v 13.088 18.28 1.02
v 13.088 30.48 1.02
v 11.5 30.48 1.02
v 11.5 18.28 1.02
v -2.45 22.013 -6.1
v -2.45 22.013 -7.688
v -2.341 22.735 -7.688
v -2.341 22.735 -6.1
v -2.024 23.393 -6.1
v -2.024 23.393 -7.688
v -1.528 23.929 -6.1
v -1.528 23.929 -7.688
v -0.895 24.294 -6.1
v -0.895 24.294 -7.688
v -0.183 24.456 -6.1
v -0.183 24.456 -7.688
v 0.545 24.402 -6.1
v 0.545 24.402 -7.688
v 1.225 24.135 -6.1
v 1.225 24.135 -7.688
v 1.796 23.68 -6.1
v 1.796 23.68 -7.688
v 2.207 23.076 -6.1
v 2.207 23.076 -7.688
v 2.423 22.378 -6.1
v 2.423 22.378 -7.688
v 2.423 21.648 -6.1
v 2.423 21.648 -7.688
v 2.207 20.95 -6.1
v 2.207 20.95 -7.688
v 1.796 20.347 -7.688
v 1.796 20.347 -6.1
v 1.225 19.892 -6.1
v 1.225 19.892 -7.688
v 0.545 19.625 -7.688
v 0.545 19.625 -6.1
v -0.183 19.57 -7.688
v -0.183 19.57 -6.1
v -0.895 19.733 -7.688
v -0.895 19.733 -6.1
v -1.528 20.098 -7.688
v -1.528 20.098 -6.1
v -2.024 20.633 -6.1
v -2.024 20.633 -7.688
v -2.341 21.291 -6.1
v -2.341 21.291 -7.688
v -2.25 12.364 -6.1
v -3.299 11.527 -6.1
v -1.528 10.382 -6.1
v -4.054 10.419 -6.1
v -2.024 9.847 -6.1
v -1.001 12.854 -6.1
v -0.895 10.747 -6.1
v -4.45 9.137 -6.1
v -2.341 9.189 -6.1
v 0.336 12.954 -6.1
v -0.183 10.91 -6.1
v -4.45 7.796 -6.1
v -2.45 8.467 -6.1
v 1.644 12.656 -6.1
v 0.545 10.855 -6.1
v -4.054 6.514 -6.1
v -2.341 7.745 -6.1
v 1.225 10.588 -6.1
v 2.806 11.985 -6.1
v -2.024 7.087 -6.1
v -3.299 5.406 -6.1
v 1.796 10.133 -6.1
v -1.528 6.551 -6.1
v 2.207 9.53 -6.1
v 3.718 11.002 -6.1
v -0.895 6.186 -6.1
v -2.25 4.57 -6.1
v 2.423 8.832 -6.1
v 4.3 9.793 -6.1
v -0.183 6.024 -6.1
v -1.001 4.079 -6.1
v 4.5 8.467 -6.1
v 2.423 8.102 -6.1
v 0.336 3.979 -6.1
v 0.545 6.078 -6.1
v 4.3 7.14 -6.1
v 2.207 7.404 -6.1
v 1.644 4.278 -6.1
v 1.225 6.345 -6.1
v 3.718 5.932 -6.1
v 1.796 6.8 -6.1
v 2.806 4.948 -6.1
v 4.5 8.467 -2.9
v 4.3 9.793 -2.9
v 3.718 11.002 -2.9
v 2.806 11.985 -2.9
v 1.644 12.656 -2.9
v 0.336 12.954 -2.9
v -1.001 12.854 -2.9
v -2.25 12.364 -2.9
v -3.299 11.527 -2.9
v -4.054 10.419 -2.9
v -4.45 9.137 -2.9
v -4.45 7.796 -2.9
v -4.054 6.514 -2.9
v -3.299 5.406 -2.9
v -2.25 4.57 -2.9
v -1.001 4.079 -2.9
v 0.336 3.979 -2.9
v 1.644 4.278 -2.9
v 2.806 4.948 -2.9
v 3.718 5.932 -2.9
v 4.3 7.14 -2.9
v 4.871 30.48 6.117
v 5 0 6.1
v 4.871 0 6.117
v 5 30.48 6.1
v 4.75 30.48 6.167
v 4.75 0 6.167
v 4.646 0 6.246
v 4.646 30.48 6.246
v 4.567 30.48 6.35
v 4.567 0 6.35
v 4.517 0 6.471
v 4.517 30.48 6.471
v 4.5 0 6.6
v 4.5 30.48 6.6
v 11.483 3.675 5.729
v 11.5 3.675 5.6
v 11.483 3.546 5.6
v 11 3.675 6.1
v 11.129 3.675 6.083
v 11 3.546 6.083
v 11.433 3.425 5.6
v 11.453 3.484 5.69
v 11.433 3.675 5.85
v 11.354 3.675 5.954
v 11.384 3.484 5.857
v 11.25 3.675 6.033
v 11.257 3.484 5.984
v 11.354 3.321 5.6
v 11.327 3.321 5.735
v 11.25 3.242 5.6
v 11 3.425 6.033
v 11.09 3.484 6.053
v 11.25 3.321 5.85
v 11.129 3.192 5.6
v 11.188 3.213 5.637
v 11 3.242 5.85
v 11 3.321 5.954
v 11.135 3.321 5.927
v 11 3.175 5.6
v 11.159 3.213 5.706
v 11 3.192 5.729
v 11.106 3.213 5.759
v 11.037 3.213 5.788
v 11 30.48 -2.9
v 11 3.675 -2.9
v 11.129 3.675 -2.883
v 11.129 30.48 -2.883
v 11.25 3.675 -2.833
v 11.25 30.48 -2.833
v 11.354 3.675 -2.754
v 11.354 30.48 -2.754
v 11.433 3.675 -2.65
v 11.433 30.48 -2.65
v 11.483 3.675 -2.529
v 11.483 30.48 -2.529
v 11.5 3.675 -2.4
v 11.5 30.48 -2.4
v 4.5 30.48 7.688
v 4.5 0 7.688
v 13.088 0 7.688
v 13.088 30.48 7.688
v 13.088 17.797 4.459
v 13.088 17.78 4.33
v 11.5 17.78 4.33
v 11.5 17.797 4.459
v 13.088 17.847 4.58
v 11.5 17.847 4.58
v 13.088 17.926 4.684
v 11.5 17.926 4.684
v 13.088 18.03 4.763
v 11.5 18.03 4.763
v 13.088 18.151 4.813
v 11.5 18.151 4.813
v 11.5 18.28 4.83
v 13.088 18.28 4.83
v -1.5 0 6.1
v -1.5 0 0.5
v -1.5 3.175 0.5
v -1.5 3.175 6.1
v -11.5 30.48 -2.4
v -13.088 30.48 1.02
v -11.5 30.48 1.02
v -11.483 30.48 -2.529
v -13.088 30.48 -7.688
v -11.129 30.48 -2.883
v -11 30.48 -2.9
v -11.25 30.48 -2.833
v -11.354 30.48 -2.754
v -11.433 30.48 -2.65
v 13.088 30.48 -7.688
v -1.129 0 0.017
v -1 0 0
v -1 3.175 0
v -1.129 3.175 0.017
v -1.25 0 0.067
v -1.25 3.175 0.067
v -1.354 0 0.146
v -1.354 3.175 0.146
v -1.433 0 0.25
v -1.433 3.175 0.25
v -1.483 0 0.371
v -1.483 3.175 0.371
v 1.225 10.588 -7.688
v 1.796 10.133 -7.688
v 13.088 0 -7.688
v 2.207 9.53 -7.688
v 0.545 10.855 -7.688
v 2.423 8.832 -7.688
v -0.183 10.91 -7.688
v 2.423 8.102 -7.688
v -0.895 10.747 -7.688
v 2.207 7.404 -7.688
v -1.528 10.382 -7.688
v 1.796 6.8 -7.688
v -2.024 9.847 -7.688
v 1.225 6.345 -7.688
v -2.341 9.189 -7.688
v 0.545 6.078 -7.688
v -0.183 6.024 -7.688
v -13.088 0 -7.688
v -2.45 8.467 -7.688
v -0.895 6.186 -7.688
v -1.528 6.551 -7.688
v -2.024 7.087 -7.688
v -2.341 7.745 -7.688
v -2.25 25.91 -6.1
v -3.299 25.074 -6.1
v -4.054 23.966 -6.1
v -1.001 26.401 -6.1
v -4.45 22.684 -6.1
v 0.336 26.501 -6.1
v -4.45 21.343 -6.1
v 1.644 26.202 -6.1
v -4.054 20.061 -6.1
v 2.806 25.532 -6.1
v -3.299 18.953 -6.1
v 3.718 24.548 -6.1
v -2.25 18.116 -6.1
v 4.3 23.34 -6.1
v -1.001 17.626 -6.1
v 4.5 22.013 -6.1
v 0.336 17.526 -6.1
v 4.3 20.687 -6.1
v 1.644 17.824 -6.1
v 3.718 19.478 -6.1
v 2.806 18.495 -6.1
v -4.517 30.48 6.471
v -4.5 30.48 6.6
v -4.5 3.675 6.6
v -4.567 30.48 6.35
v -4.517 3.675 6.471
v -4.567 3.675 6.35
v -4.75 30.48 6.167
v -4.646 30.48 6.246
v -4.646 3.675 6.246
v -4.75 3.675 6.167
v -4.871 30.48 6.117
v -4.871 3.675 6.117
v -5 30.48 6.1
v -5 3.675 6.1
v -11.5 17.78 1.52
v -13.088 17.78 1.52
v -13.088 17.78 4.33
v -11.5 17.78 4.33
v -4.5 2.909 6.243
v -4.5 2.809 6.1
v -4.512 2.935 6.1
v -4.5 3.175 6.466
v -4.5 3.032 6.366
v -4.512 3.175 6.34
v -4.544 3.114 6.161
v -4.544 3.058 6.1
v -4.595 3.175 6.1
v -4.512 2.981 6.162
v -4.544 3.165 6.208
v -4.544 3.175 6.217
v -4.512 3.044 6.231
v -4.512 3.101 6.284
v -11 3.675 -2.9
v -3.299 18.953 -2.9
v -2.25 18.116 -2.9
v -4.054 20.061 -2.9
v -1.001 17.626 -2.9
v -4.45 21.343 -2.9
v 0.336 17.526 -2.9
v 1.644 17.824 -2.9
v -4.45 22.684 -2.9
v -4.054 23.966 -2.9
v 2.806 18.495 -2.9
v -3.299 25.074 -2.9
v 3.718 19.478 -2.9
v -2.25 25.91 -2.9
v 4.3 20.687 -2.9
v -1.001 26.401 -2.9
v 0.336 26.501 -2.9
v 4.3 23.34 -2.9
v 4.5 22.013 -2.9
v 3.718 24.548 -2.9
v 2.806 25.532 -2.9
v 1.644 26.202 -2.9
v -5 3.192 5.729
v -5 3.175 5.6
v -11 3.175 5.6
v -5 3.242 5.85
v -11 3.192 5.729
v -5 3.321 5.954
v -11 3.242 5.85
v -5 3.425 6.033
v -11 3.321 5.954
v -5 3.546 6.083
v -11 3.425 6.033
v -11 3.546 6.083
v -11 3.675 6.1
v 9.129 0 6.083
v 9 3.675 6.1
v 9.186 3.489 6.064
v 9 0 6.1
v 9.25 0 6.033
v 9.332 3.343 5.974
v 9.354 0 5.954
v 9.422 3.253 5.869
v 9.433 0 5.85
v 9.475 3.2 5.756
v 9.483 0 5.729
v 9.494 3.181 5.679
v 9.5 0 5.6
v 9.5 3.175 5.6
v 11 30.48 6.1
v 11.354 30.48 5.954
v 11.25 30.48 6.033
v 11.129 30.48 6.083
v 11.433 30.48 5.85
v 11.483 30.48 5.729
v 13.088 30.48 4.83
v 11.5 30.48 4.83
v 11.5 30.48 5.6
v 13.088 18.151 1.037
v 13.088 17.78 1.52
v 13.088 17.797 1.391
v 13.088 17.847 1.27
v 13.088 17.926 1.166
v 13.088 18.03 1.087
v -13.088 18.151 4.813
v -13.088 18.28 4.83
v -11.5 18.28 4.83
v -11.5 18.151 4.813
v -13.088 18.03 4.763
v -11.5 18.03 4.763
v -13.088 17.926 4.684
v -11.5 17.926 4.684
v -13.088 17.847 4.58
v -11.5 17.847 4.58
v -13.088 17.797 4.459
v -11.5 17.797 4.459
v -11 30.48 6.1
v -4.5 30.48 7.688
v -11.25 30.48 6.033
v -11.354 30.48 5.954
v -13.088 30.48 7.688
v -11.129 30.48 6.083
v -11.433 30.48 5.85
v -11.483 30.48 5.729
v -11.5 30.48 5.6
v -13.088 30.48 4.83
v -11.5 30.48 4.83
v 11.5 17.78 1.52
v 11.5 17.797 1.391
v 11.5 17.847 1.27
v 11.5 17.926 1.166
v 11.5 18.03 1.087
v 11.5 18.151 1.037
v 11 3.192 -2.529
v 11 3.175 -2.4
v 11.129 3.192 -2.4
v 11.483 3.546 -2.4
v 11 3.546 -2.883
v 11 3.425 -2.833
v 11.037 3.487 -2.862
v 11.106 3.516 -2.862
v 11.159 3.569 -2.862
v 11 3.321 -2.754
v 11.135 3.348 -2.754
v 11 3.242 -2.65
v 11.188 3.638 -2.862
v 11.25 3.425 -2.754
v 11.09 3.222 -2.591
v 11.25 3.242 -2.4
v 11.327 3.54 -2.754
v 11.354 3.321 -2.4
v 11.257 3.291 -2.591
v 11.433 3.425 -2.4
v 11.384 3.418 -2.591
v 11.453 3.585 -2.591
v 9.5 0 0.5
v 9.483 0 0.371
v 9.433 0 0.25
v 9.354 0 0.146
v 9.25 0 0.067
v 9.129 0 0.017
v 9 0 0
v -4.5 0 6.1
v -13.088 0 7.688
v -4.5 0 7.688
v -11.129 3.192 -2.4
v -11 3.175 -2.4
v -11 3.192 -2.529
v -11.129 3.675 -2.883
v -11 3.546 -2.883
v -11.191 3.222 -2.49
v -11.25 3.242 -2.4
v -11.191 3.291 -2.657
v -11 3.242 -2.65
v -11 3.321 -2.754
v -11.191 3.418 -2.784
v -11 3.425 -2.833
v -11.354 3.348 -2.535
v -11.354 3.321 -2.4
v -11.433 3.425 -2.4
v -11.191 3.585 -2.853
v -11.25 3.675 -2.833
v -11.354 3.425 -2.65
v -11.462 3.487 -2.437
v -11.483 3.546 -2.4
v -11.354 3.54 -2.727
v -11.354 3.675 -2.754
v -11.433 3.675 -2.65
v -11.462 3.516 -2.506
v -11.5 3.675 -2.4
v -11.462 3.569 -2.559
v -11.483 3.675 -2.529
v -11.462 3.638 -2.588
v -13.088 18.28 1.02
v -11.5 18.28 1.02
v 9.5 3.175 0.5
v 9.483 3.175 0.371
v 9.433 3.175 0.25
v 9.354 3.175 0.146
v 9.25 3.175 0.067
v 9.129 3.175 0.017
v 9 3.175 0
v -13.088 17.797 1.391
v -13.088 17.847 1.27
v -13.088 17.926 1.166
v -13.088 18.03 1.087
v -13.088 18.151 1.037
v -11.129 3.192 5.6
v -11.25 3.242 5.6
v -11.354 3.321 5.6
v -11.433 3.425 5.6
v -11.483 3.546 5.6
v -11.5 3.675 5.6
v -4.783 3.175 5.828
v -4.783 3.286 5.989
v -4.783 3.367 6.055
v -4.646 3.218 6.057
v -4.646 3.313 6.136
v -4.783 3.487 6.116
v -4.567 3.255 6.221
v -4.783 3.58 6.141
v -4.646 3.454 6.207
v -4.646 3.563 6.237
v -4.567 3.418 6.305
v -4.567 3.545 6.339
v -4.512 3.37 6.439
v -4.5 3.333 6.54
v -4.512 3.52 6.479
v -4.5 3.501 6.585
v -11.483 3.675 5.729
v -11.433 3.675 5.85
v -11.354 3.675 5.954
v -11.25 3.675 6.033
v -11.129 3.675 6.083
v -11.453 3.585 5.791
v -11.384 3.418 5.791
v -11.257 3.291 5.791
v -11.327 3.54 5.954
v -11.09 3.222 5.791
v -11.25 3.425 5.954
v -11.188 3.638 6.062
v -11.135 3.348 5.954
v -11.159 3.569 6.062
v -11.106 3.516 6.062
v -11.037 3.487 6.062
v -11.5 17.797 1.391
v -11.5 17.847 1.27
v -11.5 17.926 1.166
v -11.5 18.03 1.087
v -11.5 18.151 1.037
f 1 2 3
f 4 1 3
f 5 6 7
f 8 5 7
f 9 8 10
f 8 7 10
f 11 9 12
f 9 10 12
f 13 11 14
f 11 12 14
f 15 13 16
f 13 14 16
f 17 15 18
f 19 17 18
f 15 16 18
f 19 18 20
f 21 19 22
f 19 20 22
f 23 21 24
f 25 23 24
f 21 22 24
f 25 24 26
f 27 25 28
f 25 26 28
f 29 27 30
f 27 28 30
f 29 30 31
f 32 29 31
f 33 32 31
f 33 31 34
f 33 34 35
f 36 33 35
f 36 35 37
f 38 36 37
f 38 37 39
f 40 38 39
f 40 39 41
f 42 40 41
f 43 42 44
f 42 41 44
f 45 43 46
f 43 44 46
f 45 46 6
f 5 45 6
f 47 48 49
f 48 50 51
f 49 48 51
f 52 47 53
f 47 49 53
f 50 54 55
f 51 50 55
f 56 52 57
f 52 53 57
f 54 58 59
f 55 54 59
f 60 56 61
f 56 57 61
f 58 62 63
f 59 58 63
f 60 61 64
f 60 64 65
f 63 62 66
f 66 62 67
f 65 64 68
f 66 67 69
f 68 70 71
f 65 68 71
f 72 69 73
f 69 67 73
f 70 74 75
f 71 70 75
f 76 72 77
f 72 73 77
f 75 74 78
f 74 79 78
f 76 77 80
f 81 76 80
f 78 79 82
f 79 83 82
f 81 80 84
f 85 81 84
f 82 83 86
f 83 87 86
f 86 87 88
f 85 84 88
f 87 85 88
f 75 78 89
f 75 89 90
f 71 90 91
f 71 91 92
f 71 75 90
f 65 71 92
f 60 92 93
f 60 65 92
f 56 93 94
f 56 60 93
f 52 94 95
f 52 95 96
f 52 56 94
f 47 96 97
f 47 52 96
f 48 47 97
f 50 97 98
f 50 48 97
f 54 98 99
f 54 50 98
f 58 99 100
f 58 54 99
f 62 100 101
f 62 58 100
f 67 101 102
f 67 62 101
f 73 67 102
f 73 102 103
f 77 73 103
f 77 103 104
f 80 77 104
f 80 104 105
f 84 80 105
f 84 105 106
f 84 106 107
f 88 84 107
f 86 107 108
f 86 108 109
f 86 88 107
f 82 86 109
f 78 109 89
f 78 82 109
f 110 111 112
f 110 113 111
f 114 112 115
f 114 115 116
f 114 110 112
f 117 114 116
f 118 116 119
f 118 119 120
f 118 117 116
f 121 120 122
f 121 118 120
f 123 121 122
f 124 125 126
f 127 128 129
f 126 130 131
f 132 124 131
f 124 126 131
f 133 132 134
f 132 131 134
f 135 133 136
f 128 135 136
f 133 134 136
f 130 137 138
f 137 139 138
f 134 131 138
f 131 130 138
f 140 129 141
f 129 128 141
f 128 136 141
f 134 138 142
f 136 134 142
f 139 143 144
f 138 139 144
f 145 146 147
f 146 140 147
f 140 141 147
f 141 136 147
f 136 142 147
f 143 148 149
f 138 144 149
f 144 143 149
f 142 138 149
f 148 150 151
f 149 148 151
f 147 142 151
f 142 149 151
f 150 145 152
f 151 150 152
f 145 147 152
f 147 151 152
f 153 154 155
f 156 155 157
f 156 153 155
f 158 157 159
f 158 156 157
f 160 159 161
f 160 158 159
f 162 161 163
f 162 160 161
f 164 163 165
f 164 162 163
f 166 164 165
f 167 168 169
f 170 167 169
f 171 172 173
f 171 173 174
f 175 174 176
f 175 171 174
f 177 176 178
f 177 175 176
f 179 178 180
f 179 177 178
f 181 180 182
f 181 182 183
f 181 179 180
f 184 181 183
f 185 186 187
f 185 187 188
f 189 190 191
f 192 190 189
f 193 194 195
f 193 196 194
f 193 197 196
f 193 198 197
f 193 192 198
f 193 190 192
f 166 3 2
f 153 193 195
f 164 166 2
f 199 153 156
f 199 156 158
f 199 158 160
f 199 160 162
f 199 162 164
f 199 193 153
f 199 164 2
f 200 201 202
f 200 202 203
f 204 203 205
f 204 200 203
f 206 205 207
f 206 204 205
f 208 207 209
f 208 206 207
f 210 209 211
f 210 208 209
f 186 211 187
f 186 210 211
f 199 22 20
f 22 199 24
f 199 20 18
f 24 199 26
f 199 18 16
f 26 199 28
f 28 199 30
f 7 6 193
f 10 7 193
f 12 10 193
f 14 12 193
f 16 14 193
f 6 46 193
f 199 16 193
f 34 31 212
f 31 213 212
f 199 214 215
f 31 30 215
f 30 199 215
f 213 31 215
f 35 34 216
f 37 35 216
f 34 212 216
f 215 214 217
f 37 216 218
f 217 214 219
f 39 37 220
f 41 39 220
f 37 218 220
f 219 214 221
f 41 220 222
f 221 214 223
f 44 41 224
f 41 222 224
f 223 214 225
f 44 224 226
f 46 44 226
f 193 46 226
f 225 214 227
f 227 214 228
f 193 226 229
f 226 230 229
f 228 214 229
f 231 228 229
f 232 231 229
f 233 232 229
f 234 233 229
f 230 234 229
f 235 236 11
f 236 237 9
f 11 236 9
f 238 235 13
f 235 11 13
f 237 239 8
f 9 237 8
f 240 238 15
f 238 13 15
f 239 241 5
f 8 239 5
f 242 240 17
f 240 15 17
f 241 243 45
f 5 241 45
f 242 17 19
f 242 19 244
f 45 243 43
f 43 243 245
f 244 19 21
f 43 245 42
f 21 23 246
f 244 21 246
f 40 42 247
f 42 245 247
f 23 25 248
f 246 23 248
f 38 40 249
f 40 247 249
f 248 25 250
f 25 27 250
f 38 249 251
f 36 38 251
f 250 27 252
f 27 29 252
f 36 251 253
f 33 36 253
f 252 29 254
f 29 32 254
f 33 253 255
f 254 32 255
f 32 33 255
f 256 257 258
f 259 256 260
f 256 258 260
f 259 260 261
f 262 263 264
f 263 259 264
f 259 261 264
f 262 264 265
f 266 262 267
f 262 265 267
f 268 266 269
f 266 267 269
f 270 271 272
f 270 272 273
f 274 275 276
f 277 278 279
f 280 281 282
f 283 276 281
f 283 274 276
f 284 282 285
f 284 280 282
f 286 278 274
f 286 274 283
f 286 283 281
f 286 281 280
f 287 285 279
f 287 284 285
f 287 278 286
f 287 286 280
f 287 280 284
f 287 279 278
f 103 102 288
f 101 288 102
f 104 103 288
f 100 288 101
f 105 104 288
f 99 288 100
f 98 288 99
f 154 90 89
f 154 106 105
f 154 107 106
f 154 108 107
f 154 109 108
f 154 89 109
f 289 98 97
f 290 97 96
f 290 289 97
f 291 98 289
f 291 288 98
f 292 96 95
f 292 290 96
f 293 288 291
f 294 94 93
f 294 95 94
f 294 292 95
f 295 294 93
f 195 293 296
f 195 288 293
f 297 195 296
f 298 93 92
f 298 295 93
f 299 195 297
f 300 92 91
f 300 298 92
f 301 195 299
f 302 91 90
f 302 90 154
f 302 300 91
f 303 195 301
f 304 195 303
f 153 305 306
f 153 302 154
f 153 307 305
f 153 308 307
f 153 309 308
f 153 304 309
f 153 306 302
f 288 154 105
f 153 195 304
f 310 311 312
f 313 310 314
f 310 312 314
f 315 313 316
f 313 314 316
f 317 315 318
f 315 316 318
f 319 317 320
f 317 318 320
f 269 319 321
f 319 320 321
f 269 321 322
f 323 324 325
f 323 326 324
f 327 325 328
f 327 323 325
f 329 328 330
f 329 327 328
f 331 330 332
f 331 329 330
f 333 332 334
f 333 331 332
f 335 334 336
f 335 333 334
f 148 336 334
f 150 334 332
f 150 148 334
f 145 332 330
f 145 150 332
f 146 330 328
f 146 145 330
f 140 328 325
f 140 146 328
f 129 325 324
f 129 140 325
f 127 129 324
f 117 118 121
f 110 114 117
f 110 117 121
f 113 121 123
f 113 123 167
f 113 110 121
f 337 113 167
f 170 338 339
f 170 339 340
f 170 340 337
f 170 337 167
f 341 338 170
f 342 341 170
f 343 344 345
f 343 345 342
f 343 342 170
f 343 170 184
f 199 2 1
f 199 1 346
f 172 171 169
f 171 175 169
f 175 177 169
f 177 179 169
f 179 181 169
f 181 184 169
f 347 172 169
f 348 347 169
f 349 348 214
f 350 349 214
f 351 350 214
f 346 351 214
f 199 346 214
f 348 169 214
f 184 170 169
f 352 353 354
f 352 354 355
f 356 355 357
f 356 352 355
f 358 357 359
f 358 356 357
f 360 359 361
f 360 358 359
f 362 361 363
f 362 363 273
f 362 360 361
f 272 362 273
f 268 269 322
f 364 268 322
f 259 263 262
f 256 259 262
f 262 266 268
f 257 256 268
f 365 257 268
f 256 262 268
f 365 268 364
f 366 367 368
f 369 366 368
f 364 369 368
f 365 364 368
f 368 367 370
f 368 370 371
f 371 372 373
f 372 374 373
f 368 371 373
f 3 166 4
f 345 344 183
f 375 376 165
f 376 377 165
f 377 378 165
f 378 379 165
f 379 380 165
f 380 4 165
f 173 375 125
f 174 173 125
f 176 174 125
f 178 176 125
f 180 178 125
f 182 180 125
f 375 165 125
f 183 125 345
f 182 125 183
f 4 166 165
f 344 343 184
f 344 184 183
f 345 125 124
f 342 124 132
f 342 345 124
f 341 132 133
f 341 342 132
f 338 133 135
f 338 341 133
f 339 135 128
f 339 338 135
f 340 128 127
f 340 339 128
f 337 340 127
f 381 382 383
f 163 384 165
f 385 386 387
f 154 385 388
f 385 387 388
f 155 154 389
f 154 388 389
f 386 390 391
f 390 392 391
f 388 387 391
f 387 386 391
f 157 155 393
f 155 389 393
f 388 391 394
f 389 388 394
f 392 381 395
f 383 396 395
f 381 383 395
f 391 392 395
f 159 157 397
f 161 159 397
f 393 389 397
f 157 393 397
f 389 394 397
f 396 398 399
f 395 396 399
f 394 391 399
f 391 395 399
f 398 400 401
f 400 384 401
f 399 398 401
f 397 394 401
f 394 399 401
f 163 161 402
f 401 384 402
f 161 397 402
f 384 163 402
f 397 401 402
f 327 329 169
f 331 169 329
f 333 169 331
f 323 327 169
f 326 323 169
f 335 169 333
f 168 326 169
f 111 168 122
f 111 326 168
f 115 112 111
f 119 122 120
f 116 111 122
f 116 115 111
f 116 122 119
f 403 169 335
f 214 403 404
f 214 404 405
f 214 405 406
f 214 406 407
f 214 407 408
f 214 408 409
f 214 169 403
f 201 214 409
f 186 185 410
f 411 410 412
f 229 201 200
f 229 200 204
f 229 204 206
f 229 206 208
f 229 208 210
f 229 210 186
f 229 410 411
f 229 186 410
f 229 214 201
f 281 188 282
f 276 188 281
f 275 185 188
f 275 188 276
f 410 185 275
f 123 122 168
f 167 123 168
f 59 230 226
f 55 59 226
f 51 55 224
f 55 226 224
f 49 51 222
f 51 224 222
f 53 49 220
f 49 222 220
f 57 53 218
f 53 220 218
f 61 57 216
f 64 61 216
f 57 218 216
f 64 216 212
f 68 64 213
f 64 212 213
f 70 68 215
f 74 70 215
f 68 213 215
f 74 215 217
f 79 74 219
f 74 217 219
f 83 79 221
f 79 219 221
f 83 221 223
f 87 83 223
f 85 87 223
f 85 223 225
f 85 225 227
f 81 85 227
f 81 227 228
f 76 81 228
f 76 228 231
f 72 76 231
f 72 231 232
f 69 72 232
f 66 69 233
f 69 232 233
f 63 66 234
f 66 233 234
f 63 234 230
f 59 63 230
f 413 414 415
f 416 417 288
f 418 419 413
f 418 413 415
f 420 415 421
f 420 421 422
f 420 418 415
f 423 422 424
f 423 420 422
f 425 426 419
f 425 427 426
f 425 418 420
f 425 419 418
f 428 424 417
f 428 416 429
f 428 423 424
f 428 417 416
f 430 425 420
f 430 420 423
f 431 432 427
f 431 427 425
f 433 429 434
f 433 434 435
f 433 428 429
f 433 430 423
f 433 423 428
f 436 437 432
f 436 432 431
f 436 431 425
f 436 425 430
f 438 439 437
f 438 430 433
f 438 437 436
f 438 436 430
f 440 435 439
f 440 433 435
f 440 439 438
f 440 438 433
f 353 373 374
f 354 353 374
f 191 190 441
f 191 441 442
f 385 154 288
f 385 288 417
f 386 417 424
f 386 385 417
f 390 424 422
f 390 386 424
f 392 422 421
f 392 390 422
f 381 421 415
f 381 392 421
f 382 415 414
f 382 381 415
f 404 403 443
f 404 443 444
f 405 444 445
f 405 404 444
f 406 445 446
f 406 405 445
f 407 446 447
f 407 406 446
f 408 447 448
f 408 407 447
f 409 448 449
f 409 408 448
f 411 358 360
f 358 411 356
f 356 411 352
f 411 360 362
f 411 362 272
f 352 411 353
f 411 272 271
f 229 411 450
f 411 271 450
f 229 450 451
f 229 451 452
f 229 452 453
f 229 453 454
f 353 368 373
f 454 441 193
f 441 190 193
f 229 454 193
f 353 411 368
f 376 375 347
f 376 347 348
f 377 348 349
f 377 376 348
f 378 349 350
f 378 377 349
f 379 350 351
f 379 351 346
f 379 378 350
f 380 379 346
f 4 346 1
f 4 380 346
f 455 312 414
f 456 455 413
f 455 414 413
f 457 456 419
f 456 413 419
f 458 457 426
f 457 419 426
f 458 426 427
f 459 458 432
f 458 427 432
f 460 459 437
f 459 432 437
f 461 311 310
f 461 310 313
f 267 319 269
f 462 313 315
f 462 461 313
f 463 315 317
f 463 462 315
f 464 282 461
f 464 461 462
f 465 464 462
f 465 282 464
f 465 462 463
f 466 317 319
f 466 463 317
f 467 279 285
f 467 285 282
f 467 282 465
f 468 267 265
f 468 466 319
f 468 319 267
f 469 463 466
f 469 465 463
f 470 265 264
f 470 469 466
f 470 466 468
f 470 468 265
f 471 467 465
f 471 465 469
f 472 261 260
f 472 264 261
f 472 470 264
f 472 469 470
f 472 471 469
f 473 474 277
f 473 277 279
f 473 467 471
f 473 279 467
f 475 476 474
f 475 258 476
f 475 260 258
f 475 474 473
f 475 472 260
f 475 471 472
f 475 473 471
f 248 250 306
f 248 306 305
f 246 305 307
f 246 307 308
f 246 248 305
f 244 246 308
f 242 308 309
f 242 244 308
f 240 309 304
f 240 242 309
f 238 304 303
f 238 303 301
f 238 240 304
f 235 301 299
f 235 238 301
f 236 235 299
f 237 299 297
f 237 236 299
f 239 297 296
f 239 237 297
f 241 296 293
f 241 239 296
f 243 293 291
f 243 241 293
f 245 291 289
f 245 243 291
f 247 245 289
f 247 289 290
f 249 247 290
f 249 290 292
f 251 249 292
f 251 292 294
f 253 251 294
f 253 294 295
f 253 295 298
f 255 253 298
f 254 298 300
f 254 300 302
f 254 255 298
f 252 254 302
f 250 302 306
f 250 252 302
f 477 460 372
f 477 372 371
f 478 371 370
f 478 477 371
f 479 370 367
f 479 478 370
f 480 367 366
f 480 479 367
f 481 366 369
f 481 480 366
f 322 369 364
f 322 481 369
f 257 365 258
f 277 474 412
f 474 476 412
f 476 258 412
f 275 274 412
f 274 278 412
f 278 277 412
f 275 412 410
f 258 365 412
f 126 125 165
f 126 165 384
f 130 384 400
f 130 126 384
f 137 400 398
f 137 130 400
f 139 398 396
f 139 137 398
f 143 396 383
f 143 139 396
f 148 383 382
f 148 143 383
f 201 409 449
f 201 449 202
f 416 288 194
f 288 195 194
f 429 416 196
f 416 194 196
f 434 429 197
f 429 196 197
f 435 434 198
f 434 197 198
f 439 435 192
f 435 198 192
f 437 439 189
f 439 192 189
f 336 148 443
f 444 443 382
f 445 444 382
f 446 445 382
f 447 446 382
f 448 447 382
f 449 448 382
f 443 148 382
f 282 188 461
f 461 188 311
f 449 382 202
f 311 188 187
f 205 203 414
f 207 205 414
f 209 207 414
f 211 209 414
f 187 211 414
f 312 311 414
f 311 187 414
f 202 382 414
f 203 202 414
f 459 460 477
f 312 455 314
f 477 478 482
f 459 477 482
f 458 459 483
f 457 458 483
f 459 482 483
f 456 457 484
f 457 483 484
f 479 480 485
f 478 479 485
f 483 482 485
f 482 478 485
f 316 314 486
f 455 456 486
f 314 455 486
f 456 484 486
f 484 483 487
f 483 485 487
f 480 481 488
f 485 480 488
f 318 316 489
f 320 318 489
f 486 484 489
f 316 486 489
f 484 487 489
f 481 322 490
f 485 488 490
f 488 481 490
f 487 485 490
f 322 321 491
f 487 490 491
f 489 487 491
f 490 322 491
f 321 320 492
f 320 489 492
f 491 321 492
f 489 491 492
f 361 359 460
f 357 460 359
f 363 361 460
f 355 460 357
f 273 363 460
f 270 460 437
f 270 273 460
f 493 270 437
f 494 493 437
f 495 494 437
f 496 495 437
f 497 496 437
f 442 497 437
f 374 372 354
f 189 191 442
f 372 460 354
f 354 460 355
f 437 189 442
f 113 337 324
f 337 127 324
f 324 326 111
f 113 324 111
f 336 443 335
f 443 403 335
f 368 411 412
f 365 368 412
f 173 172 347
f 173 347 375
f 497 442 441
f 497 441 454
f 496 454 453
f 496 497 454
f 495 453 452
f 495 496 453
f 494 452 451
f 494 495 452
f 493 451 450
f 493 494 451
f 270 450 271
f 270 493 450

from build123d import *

# Parameters (mm, degrees)
BOSS_EXTRUDE1_DEPTH = 30.48
BOSS_EXTRUDE2_DEPTH = 3.175
SKETCH3_W           = 3.436
SKETCH3_H           = 3.81
CUT_EXTRUDE1_DEPTH  = 12.7
SKETCH5_R           = 2.45
CUT_EXTRUDE2_DEPTH  = 1.5875
SKETCH6_W           = 23
SKETCH6_H           = 27.305
SKETCH6_R           = 4.5
BOSS_EXTRUDE3_DEPTH = 3.2
FILLET3_R           = 0.5
FILLET1_R           = 0.5
FILLET5_R           = 0.5
FILLET4_R           = 0.5
FILLET6_R           = 0.5


with BuildPart() as part:
    # Sketch1 → Boss-Extrude1 (new body)
    with BuildSketch(Plane(origin=(0, 0, 0), x_dir=(1, 0, 0), z_dir=(0, 1, 0))):
        Polygon((4.5, -6.1), (4.5, -7.6875), (13.088, -7.6875), (13.088, 7.6875), (-13.088, 7.6875), (-13.088, -7.6875), (-4.5, -7.6875), (-4.5, -6.1), (-11.5, -6.1), (-11.5, 6.1), (11.5, 6.1), (11.5, -6.1), align=None)
    extrude(amount=BOSS_EXTRUDE1_DEPTH)

    # Sketch2 → Boss-Extrude2 (add)
    with BuildSketch(Plane.XZ):
        Polygon((11.5, 0), (11.5, 6.1), (9.5, 6.1), (9.5, 0), (-1.5, 0), (-1.5, 6.1), (-11.5, 6.1), (-11.5, -6.1), (11.5, -6.1), align=None)
    extrude(amount=-BOSS_EXTRUDE2_DEPTH)

    # Sketch3 → Cut-Extrude1 (cut)
    with BuildSketch(Plane(origin=(0, 30.48, 0), x_dir=(1, 0, 0), z_dir=(0, 1, 0))):
        with Locations((-11.37, -2.925)):
            Rectangle(SKETCH3_W, SKETCH3_H)
    cut_extrude1 = extrude(amount=-CUT_EXTRUDE1_DEPTH, mode=Mode.SUBTRACT)

    # Mirror1: Cut-Extrude1 across plane
    add(cut_extrude1.mirror(Plane(origin=(0, 0, 0), x_dir=(0, 0, 1), z_dir=(1, 0, 0))), mode=Mode.SUBTRACT)

    # Sketch5 → Cut-Extrude2 (cut)
    with BuildSketch(Plane(origin=(0, 0, -7.6875), x_dir=(-1, 0, 0), z_dir=(0, 0, -1))):
        with Locations((0, 8.466666667)):
            Circle(SKETCH5_R)
        with Locations((0, 22.013333333)):
            Circle(SKETCH5_R)
    extrude(amount=-CUT_EXTRUDE2_DEPTH, mode=Mode.SUBTRACT)

    # Sketch6 → Boss-Extrude3 (add)
    with BuildSketch(Plane.XY.offset(-6.1)):
        with Locations((0, 16.8275)):
            Rectangle(SKETCH6_W, SKETCH6_H)
        with Locations((0, 22.013333333)):
            Circle(SKETCH6_R, mode=Mode.SUBTRACT)
        with Locations((0, 8.466666667)):
            Circle(SKETCH6_R, mode=Mode.SUBTRACT)
    extrude(amount=BOSS_EXTRUDE3_DEPTH)

    # Fillet3
    fillet3_edges = [part.edges().sort_by_distance(p)[0] for p in [
        (11.5, 3.175, 1.6),
        (0, 3.175, -2.9),
        (11.5, 16.8275, -2.9),
        (11.5, 16.8275, 6.1),
    ]]
    fillet(fillet3_edges, radius=FILLET3_R)

    # Fillet1
    fillet1_edges = [part.edges().sort_by_distance(p)[0] for p in [
        (-11.5, 17.0775, -2.9),
        (-11.5, 3.321446609, -2.753553391),
        (4.5, 15.24, 6.1),
        (-11.5, 3.175, 1.85),
        (-8, 3.175, 6.1),
    ]]
    fillet(fillet1_edges, radius=FILLET1_R)

    # Fillet5
    # the kernel refuses this fillet: 0.5 mm, written as the material it adds along each edge
    with BuildSketch(Plane(origin=(-13.088, 17.78, 4.83), x_dir=(0, 1, 0), z_dir=(1, 0, 0)), Plane(origin=(11.5, 17.78, 1.02), x_dir=(0, 0, 1), z_dir=(1, 0, 0))) as fillet5_piece_1:
        with BuildLine():
            CenterArc((FILLET5_R, -FILLET5_R), FILLET5_R, 90, 90)
            Line((0, -FILLET5_R), (0, 0))
            Line((0, 0), (FILLET5_R, 0))
        make_face()
    extrude(amount=1.588)
    with BuildSketch(Plane(origin=(-11.5, 17.78, 1.02), x_dir=(0, 0, 1), z_dir=(-1, 0, 0)), Plane(origin=(13.088, 17.78, 4.83), x_dir=(0, 1, 0), z_dir=(-1, 0, 0))) as fillet5_piece_2:
        with BuildLine():
            CenterArc((FILLET5_R, FILLET5_R), FILLET5_R, 180, 90)
            Line((0, FILLET5_R), (0, 0))
            Line((0, 0), (FILLET5_R, 0))
        make_face()
    extrude(amount=1.588)
    # the kernel refuses this fillet: 0.5 mm, written as the material it takes off along each edge
    with BuildSketch(Plane(origin=(-4.5, 3.675, 6.1), x_dir=(0, 0, 1), z_dir=(0, 1, 0))) as fillet5_2_piece_1:
        with BuildLine():
            CenterArc((FILLET5_R, -FILLET5_R), FILLET5_R, 90, 90)
            Line((0, -FILLET5_R), (0, 0))
            Line((0, 0), (FILLET5_R, 0))
        make_face()
    extrude(amount=28.055, mode=Mode.SUBTRACT)
    with BuildSketch(Plane(origin=(-4.5, 3.675, 5.6), x_dir=(0, 0.8017442392976493, -0.5976672776328263), z_dir=(0, 0.5976672776328263, 0.8017442392976493))) as fillet5_2_piece_2_section:
        with BuildLine():
            CenterArc((0.5 + FILLET5_R, FILLET5_R), FILLET5_R, 180, 90)
            Line((0.5, FILLET5_R), (0.5, 0))
            Line((0.5, 0), (0.5 + FILLET5_R, 0))
        make_face()
    fillet5_2_piece_2 = revolve(axis=Axis((-4.5, 3.675, 5.6), (-1, 0, 0)), revolution_arc=233.296989237, mode=Mode.PRIVATE)
    fillet5_2_piece_2 = split(fillet5_2_piece_2, bisect_by=Plane(origin=(-4.655814155, 3.175, 5.974969475), z_dir=(0, 1, 0)), keep=Keep.TOP, mode=Mode.PRIVATE)
    add(fillet5_2_piece_2, mode=Mode.SUBTRACT)
    with BuildSketch(Plane(origin=(-4.5, 3.675, 5.6), x_dir=(0, 0.8017442392976493, -0.5976672776328263), z_dir=(0, 0.5976672776328263, 0.8017442392976493))) as fillet5_2_piece_3_section:
        with BuildLine():
            CenterArc((0.5 + FILLET5_R, FILLET5_R), FILLET5_R, 180, 90)
            Line((0.5, FILLET5_R), (0.5, 0))
            Line((0.5, 0), (0.5 + FILLET5_R, 0))
        make_face()
    fillet5_2_piece_3 = revolve(axis=Axis((-4.5, 3.675, 5.6), (-1, 0, 0)), revolution_arc=233.296989237, mode=Mode.PRIVATE)
    fillet5_2_piece_3 = split(fillet5_2_piece_3, bisect_by=Plane(origin=(-4.518548164, 3.09595455, 6.1), z_dir=(0, 0, 1)), keep=Keep.TOP, mode=Mode.PRIVATE)
    add(fillet5_2_piece_3, mode=Mode.SUBTRACT)

    # Fillet4
    # the kernel refuses this fillet: 0.5 mm, written as the material it adds along each edge
    with BuildSketch(Plane(origin=(-11, 3.675, 5.6), x_dir=(-1, 0, 0), z_dir=(0, 0, 1))) as fillet4_piece_1_section:
        Polygon((0, 0), (FILLET4_R, 0), (FILLET4_R, FILLET4_R), (0, FILLET4_R), align=None)
    fillet4_piece_1 = extrude(amount=FILLET4_R, mode=Mode.PRIVATE)
    fillet4_piece_1 = fillet4_piece_1 - Plane(origin=(-11, 3.675, 5.6), x_dir=(0.7071067811865475, 0.7071067811865475, 0), z_dir=(0, 0, 1)) * Sphere(FILLET4_R, mode=Mode.PRIVATE)
    add(fillet4_piece_1)
    with BuildSketch(Plane(origin=(-11.5, 3.675, 6.1), x_dir=(1, 0, 0), z_dir=(0, 1, 0))) as fillet4_piece_2:
        with BuildLine():
            CenterArc((FILLET4_R, FILLET4_R), FILLET4_R, 180, 90)
            Line((0, FILLET4_R), (0, 0))
            Line((0, 0), (FILLET4_R, 0))
        make_face()
    extrude(amount=26.805)

    # Fillet6
    # the kernel refuses this fillet: 0.5 mm, written as the material it adds along each edge
    with BuildSketch(Plane(origin=(11, 3.675, 5.6), x_dir=(0, 0, 1), z_dir=(0, -1, 0))) as fillet6_piece_1_section:
        Polygon((0, 0), (FILLET6_R, 0), (FILLET6_R, -FILLET6_R), (0, -FILLET6_R), align=None)
    fillet6_piece_1 = extrude(amount=FILLET6_R, mode=Mode.PRIVATE)
    fillet6_piece_1 = fillet6_piece_1 - Plane(origin=(11, 3.675, 5.6), x_dir=(-0.7071067811865475, 0, -0.7071067811865475), z_dir=(0, -1, 0)) * Sphere(FILLET6_R, mode=Mode.PRIVATE)
    add(fillet6_piece_1)
    with BuildSketch(Plane(origin=(11, 3.175, 6.1), x_dir=(0, 0, -1), z_dir=(-1, 0, 0))) as fillet6_piece_2:
        with BuildLine():
            CenterArc((FILLET6_R, -FILLET6_R), FILLET6_R, 90, 90)
            Line((0, -FILLET6_R), (0, 0))
            Line((0, 0), (FILLET6_R, 0))
        make_face()
    extrude(amount=1.5)
    with BuildSketch(Plane(origin=(-1.5, 0, 0), x_dir=(1, 0, 0), z_dir=(0, 1, 0)), Plane(origin=(9.5, 0, 0), x_dir=(0, 0, 1), z_dir=(0, 1, 0)), Plane(origin=(9.5, 0, 6.1), x_dir=(-1, 0, 0), z_dir=(0, 1, 0))) as fillet6_piece_3:
        with BuildLine():
            CenterArc((FILLET6_R, -FILLET6_R), FILLET6_R, 90, 90)
            Line((0, -FILLET6_R), (0, 0))
            Line((0, 0), (FILLET6_R, 0))
        make_face()
    extrude(amount=3.175)
    with BuildSketch(Plane(origin=(11, 3.175, 6.1), x_dir=(0, 0, -1), z_dir=(-1, 0, 0))) as fillet6_piece_4a_section:
        with BuildLine():
            CenterArc((FILLET6_R, -FILLET6_R), FILLET6_R, 90, 90)
            Line((0, -FILLET6_R), (0, 0))
            Line((0, 0), (FILLET6_R, 0))
        make_face()
    fillet6_piece_4a = extrude(amount=2.75, mode=Mode.PRIVATE)
    fillet6_piece_4a = split(fillet6_piece_4a, bisect_by=Plane(origin=(9.5, 3.288197557, 5.986802443), z_dir=(-1, 0, 0)), keep=Keep.TOP, mode=Mode.PRIVATE)
    with BuildSketch(Plane(origin=(9.5, 0, 6.1), x_dir=(-1, 0, 0), z_dir=(0, 1, 0))) as fillet6_piece_4b_section:
        with BuildLine():
            CenterArc((FILLET6_R, -FILLET6_R), FILLET6_R, 90, 90)
            Line((0, -FILLET6_R), (0, 0))
            Line((0, 0), (FILLET6_R, 0))
        make_face()
    fillet6_piece_4b = extrude(amount=4.425, mode=Mode.PRIVATE)
    fillet6_piece_4b = split(fillet6_piece_4b, bisect_by=Plane(origin=(9.386802443, 3.175, 5.986802443), z_dir=(0, 1, 0)), keep=Keep.TOP, mode=Mode.PRIVATE)
    fillet6_piece_4 = fillet6_piece_4a & fillet6_piece_4b
    add(fillet6_piece_4)


solid = part.part
